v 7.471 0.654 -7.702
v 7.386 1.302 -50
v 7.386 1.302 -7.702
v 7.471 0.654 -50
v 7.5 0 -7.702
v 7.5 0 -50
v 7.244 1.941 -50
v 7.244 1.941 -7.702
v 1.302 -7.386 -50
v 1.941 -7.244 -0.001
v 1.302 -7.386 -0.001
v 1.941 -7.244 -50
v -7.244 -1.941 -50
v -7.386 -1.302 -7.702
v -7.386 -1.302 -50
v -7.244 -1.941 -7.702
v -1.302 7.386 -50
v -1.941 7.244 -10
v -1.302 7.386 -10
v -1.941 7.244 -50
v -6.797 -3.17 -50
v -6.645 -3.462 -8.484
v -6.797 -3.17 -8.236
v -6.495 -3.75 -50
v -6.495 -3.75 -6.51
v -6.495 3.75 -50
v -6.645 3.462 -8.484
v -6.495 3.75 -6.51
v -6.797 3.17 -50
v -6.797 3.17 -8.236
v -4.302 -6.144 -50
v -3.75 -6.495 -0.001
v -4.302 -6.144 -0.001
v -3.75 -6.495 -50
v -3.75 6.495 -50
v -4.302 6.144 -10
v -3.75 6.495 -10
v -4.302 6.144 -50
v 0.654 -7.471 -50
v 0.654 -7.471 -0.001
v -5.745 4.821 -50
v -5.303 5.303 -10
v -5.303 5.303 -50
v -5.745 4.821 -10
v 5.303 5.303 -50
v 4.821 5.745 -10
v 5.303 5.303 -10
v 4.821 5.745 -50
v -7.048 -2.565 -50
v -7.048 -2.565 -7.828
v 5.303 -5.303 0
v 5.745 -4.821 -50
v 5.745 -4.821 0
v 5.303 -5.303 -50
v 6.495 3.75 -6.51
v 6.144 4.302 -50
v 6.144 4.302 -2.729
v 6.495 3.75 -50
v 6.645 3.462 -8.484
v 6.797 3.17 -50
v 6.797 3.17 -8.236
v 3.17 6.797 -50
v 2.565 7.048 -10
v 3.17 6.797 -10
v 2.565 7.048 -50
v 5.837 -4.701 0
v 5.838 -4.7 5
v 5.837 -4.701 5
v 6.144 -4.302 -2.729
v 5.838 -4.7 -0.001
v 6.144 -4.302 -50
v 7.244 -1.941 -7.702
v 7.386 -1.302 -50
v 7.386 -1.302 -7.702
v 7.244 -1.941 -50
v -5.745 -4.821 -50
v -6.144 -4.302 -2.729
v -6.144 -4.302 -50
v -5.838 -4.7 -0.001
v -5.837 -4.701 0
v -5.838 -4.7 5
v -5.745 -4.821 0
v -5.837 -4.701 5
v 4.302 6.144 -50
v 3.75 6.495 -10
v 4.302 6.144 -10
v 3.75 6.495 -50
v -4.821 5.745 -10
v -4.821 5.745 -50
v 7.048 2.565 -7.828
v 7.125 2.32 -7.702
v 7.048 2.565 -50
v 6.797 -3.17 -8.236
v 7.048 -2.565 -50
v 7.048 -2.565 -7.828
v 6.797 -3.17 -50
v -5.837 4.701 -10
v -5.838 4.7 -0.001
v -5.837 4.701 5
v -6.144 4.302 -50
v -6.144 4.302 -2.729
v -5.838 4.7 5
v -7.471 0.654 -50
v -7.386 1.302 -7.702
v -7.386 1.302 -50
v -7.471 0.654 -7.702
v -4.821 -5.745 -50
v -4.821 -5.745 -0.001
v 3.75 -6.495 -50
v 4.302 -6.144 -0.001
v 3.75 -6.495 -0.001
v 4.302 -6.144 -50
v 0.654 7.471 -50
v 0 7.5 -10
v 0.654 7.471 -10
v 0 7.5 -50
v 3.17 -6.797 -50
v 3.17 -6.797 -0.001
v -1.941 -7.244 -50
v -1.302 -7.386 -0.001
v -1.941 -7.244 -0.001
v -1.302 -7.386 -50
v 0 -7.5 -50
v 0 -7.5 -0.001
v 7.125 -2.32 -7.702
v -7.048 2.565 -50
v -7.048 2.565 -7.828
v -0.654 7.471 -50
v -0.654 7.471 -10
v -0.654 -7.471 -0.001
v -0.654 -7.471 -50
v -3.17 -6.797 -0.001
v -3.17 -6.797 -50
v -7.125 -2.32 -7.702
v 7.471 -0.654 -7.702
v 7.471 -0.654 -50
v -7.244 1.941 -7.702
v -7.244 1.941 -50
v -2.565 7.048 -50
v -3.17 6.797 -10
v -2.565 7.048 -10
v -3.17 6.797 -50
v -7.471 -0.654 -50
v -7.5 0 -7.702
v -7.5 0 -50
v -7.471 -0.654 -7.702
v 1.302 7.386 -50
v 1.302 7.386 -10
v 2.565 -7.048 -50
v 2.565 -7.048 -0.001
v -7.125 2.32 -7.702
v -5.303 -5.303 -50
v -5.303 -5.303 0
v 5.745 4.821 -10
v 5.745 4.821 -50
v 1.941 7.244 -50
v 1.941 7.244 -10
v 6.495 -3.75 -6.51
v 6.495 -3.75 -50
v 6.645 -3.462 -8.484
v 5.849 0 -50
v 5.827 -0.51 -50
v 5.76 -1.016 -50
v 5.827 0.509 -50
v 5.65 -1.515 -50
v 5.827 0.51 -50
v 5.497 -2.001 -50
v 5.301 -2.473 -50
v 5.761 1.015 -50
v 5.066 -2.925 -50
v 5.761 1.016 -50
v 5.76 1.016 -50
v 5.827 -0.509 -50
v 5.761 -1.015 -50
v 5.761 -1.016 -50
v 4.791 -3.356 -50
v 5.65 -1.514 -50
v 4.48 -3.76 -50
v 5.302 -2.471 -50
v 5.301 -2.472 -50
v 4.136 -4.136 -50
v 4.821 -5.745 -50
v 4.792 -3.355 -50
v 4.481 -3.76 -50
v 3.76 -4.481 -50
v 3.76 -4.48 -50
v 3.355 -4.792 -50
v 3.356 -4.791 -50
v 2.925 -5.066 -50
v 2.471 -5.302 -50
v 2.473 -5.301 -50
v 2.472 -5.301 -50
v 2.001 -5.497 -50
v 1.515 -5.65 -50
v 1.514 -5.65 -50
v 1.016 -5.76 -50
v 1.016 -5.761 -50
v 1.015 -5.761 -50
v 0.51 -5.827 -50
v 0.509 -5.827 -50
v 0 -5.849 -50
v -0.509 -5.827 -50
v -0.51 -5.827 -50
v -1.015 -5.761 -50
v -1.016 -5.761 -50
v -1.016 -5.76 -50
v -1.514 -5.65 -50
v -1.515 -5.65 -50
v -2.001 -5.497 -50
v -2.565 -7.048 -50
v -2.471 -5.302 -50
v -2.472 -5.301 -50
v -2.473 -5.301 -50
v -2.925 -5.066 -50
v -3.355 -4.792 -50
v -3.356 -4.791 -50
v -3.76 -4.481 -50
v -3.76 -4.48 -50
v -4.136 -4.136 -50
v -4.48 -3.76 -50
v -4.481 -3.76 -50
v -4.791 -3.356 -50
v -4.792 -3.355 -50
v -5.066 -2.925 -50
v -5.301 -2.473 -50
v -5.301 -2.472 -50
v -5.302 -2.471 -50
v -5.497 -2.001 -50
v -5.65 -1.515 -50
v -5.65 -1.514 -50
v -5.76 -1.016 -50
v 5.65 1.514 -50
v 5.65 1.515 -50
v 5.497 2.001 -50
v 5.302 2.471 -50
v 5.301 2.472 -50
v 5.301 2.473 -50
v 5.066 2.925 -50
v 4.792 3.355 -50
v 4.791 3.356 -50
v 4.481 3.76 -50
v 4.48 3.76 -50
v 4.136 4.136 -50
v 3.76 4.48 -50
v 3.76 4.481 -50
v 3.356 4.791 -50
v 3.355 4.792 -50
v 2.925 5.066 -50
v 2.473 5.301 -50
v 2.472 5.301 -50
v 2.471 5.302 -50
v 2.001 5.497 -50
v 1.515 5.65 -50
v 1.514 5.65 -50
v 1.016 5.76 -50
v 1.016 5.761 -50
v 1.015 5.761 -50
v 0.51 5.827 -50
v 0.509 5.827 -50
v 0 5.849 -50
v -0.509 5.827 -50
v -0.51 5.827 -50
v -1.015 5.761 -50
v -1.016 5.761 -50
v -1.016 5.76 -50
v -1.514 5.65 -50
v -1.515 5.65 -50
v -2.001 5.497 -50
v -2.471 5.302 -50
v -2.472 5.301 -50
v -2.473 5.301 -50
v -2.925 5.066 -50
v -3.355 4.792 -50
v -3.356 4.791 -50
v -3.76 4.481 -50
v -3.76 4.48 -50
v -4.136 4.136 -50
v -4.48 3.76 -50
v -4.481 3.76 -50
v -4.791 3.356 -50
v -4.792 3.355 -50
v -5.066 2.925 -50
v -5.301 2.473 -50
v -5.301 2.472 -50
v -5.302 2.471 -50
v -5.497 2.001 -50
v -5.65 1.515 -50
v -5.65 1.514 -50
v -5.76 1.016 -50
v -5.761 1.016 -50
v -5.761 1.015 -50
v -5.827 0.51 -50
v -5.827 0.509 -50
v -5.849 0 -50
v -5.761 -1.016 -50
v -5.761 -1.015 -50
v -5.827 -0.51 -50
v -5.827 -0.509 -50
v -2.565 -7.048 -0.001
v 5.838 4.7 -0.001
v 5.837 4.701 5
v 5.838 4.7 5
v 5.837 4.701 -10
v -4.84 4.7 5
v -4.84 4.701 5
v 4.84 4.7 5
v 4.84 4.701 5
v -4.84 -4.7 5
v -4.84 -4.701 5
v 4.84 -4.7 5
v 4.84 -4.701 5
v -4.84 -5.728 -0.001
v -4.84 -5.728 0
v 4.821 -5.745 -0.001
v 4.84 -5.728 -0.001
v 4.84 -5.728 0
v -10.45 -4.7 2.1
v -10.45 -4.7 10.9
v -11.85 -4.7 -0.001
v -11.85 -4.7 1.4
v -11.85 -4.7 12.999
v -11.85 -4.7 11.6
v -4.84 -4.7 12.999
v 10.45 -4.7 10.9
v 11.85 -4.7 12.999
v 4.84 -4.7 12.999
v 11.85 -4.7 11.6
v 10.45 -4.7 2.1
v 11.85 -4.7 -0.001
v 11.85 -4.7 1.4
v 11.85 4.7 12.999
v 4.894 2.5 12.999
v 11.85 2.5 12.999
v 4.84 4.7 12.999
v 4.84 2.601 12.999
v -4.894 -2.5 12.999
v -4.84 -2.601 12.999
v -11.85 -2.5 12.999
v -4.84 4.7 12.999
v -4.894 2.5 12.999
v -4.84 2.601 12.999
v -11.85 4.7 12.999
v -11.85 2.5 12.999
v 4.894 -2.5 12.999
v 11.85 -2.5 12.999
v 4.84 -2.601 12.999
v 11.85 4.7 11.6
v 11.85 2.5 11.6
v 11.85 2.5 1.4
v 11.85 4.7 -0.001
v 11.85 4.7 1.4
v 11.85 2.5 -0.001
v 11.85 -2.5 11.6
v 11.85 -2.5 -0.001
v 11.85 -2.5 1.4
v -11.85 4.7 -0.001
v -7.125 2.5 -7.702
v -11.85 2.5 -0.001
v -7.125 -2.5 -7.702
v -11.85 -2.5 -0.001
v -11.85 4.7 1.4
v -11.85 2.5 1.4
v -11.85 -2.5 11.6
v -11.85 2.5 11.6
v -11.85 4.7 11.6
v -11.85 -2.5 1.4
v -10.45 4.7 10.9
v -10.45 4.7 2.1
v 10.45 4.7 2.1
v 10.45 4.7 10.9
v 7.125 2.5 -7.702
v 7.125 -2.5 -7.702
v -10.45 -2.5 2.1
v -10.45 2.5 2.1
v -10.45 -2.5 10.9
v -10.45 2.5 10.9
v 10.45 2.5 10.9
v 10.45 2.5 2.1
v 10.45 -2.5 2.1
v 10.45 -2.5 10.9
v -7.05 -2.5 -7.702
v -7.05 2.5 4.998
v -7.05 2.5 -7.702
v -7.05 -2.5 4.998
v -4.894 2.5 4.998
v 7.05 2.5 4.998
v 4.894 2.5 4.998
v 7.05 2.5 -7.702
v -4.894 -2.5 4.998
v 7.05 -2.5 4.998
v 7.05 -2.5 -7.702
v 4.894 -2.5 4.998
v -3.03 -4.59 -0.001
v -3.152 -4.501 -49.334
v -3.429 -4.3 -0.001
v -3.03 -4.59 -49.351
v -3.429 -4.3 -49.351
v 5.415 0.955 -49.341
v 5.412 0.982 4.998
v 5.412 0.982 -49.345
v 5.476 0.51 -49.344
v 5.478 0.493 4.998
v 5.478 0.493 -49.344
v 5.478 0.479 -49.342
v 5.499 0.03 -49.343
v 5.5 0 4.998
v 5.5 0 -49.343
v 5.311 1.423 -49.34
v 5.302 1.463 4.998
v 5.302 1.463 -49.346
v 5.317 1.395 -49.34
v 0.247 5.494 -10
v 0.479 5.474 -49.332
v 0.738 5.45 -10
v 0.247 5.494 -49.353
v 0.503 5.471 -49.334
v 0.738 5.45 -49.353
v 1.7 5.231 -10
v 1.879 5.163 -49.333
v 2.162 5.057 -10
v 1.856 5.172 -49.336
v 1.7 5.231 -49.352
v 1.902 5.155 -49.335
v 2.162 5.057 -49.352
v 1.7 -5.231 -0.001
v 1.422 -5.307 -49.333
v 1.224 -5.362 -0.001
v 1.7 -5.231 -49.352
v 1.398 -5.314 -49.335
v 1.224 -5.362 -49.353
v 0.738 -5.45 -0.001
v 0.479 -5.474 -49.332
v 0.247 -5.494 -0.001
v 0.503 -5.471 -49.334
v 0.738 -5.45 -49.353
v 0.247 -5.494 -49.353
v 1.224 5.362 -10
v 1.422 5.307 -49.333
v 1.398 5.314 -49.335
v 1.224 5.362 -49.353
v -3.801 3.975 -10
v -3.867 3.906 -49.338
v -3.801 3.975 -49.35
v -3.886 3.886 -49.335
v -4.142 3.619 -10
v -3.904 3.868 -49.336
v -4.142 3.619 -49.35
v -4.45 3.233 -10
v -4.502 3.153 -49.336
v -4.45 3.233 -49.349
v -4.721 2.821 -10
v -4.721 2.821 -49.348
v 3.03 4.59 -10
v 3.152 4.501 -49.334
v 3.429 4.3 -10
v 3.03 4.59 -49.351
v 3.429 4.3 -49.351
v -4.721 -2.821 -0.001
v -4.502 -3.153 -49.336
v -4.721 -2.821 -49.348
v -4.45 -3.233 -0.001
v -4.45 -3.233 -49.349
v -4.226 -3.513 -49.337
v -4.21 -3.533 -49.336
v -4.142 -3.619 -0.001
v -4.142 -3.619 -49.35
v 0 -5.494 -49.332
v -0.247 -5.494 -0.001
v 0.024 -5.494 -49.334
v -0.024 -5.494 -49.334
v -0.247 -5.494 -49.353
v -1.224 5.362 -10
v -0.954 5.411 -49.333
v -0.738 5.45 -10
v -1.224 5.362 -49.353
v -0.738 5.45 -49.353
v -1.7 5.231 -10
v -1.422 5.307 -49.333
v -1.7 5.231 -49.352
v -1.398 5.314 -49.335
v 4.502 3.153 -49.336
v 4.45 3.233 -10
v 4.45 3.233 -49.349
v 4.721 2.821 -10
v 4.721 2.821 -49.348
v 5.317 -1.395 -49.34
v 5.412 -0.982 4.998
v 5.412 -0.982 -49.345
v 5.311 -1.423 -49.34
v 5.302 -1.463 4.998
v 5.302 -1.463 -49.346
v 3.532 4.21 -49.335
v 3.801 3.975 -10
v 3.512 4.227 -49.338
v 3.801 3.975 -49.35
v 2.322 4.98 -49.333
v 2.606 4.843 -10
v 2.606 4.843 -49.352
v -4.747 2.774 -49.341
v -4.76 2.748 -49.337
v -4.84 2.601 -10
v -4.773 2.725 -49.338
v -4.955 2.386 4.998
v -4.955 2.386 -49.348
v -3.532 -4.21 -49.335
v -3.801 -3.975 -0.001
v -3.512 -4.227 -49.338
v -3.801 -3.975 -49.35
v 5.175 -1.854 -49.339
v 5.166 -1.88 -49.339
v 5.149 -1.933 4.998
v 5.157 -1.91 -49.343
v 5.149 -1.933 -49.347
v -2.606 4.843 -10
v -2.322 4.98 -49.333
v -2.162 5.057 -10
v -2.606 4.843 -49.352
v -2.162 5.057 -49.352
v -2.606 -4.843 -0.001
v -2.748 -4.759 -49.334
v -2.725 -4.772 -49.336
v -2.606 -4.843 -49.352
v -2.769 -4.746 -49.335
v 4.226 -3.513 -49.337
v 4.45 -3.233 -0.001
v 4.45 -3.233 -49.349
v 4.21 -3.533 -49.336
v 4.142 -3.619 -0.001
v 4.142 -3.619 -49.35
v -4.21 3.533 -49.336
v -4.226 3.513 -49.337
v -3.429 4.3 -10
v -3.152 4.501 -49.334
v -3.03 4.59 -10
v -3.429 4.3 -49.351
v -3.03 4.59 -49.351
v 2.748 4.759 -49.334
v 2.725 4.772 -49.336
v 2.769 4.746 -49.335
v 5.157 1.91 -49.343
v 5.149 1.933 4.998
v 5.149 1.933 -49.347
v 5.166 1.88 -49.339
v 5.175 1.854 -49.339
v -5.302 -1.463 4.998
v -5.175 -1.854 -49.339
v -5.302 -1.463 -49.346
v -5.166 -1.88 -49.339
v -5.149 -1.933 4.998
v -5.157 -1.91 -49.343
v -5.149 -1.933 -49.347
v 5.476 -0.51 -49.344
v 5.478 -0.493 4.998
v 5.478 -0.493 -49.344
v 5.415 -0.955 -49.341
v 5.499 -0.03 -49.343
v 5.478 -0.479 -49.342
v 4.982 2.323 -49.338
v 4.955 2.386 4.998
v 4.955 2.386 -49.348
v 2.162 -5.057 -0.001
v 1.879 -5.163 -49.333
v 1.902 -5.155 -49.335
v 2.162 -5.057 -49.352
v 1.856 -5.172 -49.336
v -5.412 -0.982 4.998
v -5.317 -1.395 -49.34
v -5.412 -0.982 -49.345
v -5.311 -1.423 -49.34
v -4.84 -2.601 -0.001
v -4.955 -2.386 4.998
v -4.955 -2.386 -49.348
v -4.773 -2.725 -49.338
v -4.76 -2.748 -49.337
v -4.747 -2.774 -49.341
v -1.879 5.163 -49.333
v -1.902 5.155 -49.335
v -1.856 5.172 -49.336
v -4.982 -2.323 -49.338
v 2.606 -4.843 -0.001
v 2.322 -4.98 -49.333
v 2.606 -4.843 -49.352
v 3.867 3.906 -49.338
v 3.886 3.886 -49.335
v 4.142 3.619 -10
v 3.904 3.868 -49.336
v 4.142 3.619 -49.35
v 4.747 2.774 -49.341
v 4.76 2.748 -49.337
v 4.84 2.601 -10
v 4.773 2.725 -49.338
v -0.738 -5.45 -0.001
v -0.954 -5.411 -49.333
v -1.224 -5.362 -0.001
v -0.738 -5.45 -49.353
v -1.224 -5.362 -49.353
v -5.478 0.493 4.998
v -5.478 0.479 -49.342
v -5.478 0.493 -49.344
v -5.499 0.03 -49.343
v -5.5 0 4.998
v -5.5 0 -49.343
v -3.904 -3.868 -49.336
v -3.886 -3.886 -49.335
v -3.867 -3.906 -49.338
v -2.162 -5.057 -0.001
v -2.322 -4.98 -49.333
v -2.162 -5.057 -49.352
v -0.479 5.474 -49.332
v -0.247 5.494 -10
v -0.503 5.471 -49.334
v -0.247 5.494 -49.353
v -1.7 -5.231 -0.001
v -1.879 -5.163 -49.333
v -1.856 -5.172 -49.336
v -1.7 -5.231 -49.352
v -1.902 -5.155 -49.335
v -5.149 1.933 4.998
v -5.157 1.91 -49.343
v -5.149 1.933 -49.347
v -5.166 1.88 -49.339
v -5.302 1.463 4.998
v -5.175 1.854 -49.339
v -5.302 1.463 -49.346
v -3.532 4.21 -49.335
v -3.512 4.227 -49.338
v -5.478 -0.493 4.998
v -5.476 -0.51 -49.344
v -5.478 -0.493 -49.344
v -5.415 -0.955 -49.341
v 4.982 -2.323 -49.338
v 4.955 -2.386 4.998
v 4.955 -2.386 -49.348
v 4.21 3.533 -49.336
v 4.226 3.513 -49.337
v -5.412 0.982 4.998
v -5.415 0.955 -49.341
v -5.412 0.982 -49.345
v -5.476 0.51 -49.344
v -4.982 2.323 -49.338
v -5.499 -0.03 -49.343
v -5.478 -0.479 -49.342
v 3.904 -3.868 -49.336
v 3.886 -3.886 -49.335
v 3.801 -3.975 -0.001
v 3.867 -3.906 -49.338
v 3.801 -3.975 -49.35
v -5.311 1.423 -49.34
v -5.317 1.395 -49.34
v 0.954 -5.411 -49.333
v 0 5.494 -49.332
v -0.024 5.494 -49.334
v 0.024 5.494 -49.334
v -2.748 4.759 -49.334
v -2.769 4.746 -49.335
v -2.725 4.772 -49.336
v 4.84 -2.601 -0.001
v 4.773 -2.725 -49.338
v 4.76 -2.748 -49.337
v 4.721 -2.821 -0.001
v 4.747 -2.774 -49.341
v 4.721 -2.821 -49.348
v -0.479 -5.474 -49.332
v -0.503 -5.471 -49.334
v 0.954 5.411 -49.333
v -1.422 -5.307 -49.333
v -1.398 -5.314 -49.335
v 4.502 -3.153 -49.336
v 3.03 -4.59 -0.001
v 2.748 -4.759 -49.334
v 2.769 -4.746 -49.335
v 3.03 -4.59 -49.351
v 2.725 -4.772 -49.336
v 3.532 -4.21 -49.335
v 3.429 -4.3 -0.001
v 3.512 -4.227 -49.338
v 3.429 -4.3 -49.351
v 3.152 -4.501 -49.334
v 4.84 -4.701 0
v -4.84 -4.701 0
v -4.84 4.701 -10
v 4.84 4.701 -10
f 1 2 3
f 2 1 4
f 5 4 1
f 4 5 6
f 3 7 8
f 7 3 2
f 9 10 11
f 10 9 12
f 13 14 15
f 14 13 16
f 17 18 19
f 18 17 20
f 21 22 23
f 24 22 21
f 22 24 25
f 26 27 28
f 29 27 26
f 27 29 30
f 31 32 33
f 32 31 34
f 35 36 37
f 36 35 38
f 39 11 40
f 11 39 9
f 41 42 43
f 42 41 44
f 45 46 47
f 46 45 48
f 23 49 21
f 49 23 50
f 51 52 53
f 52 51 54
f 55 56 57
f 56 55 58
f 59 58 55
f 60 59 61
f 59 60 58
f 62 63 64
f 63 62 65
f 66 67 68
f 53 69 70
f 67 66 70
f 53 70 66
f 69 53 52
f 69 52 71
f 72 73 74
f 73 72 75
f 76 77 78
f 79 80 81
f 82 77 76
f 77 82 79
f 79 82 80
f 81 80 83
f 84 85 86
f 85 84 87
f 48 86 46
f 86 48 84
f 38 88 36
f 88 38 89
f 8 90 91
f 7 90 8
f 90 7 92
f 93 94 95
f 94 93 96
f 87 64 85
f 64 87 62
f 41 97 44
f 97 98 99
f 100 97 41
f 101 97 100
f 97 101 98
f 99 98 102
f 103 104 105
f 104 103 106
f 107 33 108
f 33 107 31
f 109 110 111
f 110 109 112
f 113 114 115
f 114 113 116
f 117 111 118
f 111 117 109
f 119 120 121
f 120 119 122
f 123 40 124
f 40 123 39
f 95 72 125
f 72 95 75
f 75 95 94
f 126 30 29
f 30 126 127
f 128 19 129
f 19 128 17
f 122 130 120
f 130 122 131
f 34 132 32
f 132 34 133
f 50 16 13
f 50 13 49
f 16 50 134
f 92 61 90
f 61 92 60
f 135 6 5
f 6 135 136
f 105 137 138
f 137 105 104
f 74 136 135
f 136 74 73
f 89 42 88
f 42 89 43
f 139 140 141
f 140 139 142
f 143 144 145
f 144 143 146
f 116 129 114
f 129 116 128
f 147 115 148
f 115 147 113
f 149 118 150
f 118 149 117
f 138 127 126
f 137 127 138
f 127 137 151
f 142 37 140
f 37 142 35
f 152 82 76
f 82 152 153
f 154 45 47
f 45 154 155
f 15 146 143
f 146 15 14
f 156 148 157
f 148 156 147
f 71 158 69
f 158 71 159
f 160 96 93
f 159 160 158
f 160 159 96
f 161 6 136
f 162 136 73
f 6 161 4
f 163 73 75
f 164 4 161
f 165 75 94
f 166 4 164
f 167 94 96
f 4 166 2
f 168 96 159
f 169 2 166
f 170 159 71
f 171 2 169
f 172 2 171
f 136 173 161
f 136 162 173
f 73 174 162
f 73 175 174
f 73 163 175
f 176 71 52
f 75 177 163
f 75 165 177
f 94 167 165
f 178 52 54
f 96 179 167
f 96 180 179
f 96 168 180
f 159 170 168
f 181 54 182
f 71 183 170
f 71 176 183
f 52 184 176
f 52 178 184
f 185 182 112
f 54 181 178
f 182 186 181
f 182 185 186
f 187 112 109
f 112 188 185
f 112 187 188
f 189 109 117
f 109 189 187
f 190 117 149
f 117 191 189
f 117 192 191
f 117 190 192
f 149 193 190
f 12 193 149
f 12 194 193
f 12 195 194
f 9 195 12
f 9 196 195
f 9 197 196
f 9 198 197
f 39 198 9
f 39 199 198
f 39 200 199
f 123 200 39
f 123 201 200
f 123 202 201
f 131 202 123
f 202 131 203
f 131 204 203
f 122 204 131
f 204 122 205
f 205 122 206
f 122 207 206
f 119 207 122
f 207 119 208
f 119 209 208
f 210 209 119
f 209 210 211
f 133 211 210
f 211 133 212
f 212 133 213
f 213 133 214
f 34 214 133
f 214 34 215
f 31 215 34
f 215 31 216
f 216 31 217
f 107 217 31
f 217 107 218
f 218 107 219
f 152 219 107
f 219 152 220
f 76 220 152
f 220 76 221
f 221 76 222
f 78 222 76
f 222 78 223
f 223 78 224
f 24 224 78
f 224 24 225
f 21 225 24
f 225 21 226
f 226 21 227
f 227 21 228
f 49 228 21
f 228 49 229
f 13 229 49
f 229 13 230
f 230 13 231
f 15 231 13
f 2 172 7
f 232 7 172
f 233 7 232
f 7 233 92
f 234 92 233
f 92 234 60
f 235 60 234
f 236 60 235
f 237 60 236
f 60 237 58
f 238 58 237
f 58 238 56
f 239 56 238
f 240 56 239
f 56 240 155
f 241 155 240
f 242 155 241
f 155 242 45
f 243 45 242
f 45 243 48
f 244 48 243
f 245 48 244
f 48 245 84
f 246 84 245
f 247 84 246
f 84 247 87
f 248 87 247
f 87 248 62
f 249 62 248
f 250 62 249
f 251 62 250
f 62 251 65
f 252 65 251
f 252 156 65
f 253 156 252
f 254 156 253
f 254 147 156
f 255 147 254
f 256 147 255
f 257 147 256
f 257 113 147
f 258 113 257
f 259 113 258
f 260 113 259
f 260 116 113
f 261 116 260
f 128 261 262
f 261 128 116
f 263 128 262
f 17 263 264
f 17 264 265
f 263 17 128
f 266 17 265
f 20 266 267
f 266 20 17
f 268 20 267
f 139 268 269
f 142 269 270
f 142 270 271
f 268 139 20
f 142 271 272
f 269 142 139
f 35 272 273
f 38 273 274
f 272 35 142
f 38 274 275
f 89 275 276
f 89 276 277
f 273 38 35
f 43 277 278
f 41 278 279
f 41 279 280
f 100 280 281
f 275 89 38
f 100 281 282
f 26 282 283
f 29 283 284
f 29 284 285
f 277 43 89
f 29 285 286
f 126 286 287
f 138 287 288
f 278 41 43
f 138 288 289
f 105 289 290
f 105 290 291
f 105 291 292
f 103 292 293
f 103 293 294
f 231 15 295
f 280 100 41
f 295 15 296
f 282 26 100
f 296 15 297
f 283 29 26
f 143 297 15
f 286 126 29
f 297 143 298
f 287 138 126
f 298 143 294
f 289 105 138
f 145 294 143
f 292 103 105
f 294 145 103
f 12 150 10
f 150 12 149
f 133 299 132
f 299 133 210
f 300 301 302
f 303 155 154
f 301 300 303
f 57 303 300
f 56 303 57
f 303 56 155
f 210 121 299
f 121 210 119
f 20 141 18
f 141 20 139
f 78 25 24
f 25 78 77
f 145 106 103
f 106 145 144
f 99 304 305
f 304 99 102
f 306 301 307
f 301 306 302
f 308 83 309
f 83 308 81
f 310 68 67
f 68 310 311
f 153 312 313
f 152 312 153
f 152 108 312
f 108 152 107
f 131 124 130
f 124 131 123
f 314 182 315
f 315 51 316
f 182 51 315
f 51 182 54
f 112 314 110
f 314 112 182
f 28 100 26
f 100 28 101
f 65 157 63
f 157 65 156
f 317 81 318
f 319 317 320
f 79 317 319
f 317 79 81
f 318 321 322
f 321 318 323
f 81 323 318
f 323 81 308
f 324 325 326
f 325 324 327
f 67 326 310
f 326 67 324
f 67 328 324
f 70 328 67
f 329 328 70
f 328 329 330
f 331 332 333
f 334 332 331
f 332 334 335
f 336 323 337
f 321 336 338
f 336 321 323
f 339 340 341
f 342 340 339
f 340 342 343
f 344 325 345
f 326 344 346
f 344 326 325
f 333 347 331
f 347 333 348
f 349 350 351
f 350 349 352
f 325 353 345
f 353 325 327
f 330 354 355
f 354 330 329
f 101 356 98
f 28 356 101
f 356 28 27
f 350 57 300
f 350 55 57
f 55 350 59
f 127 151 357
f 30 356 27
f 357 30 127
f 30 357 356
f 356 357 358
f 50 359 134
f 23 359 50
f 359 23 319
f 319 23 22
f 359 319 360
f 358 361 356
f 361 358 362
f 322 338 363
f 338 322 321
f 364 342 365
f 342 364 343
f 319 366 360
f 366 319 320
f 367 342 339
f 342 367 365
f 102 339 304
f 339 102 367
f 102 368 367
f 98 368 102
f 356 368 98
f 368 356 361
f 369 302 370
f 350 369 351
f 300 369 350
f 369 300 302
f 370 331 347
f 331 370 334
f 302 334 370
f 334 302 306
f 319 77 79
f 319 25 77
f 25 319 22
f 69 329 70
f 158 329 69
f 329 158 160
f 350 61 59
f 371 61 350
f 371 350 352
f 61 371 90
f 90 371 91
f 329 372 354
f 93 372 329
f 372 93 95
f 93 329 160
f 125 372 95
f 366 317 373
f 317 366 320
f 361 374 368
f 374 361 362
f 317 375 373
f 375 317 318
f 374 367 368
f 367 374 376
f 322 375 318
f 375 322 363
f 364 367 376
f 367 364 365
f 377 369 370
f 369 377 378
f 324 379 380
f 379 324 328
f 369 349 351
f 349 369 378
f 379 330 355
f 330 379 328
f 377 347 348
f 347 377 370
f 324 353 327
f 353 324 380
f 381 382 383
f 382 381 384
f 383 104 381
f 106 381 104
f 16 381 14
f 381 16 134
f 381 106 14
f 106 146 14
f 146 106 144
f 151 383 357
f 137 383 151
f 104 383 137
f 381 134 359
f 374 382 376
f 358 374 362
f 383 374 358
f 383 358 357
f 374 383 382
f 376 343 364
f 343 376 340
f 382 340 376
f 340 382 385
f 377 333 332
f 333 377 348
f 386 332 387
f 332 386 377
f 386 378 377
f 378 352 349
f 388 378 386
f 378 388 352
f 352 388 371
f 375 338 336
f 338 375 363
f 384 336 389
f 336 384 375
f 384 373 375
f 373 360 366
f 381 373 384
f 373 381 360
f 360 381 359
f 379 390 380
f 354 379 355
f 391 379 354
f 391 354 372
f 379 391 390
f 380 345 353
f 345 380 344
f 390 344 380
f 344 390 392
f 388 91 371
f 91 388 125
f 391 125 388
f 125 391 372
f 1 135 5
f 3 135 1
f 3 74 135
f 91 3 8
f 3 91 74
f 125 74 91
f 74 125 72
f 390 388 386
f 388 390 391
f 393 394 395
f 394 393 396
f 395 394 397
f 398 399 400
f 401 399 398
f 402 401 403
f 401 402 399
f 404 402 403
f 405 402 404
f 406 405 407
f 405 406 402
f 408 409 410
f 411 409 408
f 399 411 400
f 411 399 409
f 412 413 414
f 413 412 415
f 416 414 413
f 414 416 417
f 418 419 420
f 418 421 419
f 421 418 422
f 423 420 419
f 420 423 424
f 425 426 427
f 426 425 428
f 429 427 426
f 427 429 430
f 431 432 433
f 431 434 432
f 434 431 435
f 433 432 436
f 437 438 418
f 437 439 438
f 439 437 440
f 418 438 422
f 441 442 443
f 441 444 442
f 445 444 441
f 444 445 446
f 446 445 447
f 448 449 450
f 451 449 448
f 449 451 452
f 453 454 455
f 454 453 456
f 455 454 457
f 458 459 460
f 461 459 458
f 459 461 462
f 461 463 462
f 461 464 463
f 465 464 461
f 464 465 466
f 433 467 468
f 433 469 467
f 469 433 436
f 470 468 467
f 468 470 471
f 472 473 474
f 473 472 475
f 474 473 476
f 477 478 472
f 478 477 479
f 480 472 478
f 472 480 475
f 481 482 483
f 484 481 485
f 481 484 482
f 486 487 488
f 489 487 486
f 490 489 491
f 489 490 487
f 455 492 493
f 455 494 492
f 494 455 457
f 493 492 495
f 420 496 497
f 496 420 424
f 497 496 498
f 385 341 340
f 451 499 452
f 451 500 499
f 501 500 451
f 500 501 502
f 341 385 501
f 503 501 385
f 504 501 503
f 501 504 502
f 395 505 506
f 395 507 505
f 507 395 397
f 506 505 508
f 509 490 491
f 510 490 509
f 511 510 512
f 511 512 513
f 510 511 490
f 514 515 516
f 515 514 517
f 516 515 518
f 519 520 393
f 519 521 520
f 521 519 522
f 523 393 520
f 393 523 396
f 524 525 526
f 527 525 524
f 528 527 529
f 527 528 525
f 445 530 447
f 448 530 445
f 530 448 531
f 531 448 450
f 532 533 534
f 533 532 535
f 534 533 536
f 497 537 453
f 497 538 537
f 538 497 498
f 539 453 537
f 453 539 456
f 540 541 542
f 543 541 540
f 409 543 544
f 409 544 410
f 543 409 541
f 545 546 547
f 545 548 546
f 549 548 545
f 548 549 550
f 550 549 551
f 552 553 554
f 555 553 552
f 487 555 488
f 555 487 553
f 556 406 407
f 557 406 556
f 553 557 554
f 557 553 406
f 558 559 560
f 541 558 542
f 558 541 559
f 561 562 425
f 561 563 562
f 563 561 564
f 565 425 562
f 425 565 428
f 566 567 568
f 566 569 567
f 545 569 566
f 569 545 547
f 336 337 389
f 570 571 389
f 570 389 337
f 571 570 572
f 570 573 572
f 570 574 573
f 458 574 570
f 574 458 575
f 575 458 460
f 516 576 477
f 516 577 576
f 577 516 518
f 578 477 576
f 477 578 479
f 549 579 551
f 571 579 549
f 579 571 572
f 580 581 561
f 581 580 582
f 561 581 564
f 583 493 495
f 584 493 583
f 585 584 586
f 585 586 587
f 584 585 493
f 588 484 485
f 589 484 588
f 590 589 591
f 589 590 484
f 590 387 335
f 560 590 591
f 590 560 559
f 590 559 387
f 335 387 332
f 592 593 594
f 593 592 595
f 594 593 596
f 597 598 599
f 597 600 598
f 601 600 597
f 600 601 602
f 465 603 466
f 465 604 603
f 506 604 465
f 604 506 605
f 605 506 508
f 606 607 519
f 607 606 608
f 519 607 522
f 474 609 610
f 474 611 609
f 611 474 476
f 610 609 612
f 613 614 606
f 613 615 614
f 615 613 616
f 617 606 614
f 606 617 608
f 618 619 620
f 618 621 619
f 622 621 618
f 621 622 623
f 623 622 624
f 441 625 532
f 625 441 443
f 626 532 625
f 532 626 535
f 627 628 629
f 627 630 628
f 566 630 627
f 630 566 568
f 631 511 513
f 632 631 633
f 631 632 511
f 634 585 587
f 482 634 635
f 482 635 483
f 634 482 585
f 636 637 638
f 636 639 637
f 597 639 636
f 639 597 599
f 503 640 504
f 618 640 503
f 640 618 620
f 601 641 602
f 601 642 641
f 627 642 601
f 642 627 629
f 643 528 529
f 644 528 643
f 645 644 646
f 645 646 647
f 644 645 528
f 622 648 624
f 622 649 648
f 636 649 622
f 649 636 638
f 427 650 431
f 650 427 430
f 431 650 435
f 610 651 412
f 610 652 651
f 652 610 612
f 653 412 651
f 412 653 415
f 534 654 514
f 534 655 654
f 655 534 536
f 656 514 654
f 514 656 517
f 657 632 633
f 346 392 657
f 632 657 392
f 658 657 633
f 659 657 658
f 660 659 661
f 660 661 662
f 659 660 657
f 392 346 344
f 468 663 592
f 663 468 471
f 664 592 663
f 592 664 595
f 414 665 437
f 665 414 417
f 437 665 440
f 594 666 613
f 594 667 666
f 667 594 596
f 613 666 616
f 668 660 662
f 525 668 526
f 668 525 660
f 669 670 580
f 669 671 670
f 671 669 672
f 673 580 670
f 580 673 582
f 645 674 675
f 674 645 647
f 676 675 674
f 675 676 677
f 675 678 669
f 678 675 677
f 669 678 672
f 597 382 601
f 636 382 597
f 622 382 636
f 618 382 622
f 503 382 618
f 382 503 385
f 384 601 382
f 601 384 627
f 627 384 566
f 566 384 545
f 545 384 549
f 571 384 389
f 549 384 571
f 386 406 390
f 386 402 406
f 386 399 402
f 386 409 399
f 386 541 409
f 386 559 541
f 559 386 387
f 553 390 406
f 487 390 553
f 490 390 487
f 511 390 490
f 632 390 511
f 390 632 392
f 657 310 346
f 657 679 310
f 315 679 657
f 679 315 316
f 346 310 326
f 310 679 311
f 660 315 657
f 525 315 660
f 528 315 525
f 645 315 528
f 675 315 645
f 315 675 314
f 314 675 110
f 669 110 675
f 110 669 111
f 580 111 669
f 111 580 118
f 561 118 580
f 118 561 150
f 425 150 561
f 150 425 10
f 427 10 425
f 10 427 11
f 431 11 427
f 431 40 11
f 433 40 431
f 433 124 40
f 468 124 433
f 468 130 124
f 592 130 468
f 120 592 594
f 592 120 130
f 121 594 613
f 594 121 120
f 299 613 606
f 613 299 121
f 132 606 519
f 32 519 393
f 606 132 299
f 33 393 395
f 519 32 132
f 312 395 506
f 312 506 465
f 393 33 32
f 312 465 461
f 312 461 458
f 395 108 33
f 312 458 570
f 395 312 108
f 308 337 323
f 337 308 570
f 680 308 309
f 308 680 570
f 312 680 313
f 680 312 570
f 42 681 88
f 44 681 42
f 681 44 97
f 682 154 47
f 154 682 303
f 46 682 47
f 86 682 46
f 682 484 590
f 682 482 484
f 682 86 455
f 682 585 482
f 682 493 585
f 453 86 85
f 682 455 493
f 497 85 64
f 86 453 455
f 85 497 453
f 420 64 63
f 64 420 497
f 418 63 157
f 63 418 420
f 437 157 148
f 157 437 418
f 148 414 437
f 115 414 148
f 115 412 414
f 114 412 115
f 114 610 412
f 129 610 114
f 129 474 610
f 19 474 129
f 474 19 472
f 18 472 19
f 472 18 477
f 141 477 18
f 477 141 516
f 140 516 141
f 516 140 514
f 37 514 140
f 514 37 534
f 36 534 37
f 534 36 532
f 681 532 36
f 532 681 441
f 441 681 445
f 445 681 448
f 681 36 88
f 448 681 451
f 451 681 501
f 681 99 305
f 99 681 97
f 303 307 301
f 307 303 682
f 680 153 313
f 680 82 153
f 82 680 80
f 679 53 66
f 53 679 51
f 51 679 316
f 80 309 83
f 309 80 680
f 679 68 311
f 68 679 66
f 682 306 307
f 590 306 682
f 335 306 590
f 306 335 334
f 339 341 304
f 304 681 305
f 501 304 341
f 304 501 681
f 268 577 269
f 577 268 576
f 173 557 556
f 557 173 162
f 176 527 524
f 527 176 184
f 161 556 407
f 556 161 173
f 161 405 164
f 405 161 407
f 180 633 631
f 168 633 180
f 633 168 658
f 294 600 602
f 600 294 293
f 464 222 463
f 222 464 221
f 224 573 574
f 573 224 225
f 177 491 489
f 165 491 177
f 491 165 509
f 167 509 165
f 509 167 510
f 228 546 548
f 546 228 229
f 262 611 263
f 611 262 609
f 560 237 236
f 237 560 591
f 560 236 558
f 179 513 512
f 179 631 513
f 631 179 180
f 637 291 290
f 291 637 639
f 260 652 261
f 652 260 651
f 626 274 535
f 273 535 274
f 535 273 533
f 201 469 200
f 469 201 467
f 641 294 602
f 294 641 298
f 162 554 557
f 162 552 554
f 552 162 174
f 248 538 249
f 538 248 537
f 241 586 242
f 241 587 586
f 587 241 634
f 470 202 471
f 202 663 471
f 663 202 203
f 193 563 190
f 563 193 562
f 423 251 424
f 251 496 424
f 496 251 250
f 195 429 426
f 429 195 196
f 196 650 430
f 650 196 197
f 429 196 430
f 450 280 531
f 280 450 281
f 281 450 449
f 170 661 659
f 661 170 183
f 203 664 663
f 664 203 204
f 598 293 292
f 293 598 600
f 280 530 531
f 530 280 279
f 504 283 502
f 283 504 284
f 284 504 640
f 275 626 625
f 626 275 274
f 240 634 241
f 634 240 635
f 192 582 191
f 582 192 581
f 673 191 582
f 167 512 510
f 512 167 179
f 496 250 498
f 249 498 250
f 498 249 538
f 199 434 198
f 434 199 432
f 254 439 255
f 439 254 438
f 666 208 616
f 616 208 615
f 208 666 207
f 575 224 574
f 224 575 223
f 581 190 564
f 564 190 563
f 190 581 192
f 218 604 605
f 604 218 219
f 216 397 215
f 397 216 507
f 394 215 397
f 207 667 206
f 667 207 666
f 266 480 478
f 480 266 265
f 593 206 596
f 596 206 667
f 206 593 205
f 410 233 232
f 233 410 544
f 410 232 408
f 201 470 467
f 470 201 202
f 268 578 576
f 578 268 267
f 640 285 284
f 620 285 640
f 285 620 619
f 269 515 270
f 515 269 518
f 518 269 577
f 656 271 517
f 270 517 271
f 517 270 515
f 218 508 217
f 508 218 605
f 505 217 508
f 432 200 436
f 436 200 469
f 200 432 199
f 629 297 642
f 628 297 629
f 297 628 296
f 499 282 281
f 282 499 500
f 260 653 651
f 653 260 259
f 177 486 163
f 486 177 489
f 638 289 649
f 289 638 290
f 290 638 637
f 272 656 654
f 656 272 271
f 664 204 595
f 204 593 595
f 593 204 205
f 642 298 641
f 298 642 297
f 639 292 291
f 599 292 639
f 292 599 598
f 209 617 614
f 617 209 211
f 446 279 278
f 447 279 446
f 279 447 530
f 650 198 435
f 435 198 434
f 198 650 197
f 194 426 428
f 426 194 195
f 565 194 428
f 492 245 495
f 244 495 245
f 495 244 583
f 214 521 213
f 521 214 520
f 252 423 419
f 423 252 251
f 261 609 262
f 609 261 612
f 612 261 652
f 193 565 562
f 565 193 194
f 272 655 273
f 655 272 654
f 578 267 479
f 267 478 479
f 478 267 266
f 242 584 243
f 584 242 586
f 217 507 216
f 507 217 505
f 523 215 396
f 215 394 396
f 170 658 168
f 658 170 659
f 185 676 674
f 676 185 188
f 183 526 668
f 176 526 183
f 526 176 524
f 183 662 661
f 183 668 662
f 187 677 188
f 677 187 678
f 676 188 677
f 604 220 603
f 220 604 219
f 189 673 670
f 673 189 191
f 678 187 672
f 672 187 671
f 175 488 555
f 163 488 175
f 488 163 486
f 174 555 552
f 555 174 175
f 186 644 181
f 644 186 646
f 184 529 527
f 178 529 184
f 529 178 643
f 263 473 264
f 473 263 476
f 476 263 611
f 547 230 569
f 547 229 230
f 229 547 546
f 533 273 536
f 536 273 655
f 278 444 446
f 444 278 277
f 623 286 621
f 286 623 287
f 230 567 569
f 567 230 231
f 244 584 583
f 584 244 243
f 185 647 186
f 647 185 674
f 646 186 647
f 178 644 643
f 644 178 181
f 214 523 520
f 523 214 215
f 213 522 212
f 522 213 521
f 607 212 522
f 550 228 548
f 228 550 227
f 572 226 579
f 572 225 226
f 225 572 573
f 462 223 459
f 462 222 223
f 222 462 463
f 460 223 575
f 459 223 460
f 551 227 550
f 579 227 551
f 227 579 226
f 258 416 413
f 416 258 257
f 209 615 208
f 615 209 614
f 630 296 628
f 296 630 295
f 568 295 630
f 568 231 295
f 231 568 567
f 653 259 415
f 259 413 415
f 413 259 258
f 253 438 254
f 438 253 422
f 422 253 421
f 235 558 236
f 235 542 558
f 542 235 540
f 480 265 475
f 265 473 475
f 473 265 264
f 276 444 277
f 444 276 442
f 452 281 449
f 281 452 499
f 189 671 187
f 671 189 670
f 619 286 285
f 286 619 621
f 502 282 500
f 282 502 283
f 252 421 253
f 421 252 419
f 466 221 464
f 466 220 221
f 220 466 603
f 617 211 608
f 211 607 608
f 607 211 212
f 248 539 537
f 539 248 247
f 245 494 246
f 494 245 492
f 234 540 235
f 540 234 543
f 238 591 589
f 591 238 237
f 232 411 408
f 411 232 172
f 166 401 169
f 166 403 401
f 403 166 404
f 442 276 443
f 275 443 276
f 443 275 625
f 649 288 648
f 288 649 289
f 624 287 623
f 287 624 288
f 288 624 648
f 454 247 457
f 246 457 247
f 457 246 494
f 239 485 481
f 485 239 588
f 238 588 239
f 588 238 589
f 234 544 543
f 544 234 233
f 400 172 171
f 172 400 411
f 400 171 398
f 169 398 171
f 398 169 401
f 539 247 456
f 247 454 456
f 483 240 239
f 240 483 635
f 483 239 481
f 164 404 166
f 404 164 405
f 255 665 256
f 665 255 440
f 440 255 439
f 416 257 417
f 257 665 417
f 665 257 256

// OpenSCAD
$fa = 5;
$fs = 0.5;
eps = 0.001;

tube_id = 11;
tube_od = tube_id + 4;
tube_length = 50;

loom_width = 20.9;
loom_gap = 5;
loom_wall = 2.2;
lip = 1.4;
loom_height = 13;

join = 5;

difference() {
  union() {
    translate([0, 0, -tube_length])
      cylinder(tube_length + join, d=tube_od);
    
    hull() {
      translate([0, 0, loom_height/2 - eps])
        cube([loom_width + 2*lip, loom_gap + 2*loom_wall, loom_height], center=true);
      translate([0, 0, -18])
        cube([1, 4, 1], center=true);
    }
  }
  
  // Inside of tube.
  translate([0, 0, -tube_length-eps])
    cylinder(tube_length*2, d=tube_id);
  
  // Transverse gap.
  translate([0, 0, loom_height/2 + join - eps])
    cube([loom_width + 2*lip + eps, loom_gap, loom_height + eps], center=true);
  
  // Cross gap.
  translate([0, -10, loom_height/2 - eps])
    cube([tube_id*0.88, 20, loom_height + eps], center=true);
  
  // Lips.
  for (a = [-1, 1]) {
    scale([a, 1, 1]) {
      hull() {
        translate([loom_width/2, -10, 1.5*lip])
          cube([20, 20, loom_height - 3*lip]);
        translate([loom_width/2 + lip, -10, lip])
          cube([20, 20, loom_height - 2*lip]);
      }
    }
  }
  
  // Observation ports.
  translate([-10, loom_gap/2 + loom_wall + eps, -10])
    cube(20);
  translate([-10, -loom_gap/2 - loom_wall - eps - 20, 0])
    cube(20);
  translate([-tube_id*0.44, loom_gap/2 + eps, -10])
    cube([tube_id*0.88, 20, 30]);
  
  // Gap between lips for hook.
  for (a = [-1, 1])
    scale([a, 1, 1])
      translate([tube_od*0.47, -loom_gap/2, -7.7-2*eps])
        cube([20, loom_gap, 20]); 
  
  // Inner chamfer on bottom.
  translate([0, 0, -tube_length-eps])
    linear_extrude(0.7, scale=(tube_id-0.7)/tube_id)
      circle(d=tube_id+0.7);
}
